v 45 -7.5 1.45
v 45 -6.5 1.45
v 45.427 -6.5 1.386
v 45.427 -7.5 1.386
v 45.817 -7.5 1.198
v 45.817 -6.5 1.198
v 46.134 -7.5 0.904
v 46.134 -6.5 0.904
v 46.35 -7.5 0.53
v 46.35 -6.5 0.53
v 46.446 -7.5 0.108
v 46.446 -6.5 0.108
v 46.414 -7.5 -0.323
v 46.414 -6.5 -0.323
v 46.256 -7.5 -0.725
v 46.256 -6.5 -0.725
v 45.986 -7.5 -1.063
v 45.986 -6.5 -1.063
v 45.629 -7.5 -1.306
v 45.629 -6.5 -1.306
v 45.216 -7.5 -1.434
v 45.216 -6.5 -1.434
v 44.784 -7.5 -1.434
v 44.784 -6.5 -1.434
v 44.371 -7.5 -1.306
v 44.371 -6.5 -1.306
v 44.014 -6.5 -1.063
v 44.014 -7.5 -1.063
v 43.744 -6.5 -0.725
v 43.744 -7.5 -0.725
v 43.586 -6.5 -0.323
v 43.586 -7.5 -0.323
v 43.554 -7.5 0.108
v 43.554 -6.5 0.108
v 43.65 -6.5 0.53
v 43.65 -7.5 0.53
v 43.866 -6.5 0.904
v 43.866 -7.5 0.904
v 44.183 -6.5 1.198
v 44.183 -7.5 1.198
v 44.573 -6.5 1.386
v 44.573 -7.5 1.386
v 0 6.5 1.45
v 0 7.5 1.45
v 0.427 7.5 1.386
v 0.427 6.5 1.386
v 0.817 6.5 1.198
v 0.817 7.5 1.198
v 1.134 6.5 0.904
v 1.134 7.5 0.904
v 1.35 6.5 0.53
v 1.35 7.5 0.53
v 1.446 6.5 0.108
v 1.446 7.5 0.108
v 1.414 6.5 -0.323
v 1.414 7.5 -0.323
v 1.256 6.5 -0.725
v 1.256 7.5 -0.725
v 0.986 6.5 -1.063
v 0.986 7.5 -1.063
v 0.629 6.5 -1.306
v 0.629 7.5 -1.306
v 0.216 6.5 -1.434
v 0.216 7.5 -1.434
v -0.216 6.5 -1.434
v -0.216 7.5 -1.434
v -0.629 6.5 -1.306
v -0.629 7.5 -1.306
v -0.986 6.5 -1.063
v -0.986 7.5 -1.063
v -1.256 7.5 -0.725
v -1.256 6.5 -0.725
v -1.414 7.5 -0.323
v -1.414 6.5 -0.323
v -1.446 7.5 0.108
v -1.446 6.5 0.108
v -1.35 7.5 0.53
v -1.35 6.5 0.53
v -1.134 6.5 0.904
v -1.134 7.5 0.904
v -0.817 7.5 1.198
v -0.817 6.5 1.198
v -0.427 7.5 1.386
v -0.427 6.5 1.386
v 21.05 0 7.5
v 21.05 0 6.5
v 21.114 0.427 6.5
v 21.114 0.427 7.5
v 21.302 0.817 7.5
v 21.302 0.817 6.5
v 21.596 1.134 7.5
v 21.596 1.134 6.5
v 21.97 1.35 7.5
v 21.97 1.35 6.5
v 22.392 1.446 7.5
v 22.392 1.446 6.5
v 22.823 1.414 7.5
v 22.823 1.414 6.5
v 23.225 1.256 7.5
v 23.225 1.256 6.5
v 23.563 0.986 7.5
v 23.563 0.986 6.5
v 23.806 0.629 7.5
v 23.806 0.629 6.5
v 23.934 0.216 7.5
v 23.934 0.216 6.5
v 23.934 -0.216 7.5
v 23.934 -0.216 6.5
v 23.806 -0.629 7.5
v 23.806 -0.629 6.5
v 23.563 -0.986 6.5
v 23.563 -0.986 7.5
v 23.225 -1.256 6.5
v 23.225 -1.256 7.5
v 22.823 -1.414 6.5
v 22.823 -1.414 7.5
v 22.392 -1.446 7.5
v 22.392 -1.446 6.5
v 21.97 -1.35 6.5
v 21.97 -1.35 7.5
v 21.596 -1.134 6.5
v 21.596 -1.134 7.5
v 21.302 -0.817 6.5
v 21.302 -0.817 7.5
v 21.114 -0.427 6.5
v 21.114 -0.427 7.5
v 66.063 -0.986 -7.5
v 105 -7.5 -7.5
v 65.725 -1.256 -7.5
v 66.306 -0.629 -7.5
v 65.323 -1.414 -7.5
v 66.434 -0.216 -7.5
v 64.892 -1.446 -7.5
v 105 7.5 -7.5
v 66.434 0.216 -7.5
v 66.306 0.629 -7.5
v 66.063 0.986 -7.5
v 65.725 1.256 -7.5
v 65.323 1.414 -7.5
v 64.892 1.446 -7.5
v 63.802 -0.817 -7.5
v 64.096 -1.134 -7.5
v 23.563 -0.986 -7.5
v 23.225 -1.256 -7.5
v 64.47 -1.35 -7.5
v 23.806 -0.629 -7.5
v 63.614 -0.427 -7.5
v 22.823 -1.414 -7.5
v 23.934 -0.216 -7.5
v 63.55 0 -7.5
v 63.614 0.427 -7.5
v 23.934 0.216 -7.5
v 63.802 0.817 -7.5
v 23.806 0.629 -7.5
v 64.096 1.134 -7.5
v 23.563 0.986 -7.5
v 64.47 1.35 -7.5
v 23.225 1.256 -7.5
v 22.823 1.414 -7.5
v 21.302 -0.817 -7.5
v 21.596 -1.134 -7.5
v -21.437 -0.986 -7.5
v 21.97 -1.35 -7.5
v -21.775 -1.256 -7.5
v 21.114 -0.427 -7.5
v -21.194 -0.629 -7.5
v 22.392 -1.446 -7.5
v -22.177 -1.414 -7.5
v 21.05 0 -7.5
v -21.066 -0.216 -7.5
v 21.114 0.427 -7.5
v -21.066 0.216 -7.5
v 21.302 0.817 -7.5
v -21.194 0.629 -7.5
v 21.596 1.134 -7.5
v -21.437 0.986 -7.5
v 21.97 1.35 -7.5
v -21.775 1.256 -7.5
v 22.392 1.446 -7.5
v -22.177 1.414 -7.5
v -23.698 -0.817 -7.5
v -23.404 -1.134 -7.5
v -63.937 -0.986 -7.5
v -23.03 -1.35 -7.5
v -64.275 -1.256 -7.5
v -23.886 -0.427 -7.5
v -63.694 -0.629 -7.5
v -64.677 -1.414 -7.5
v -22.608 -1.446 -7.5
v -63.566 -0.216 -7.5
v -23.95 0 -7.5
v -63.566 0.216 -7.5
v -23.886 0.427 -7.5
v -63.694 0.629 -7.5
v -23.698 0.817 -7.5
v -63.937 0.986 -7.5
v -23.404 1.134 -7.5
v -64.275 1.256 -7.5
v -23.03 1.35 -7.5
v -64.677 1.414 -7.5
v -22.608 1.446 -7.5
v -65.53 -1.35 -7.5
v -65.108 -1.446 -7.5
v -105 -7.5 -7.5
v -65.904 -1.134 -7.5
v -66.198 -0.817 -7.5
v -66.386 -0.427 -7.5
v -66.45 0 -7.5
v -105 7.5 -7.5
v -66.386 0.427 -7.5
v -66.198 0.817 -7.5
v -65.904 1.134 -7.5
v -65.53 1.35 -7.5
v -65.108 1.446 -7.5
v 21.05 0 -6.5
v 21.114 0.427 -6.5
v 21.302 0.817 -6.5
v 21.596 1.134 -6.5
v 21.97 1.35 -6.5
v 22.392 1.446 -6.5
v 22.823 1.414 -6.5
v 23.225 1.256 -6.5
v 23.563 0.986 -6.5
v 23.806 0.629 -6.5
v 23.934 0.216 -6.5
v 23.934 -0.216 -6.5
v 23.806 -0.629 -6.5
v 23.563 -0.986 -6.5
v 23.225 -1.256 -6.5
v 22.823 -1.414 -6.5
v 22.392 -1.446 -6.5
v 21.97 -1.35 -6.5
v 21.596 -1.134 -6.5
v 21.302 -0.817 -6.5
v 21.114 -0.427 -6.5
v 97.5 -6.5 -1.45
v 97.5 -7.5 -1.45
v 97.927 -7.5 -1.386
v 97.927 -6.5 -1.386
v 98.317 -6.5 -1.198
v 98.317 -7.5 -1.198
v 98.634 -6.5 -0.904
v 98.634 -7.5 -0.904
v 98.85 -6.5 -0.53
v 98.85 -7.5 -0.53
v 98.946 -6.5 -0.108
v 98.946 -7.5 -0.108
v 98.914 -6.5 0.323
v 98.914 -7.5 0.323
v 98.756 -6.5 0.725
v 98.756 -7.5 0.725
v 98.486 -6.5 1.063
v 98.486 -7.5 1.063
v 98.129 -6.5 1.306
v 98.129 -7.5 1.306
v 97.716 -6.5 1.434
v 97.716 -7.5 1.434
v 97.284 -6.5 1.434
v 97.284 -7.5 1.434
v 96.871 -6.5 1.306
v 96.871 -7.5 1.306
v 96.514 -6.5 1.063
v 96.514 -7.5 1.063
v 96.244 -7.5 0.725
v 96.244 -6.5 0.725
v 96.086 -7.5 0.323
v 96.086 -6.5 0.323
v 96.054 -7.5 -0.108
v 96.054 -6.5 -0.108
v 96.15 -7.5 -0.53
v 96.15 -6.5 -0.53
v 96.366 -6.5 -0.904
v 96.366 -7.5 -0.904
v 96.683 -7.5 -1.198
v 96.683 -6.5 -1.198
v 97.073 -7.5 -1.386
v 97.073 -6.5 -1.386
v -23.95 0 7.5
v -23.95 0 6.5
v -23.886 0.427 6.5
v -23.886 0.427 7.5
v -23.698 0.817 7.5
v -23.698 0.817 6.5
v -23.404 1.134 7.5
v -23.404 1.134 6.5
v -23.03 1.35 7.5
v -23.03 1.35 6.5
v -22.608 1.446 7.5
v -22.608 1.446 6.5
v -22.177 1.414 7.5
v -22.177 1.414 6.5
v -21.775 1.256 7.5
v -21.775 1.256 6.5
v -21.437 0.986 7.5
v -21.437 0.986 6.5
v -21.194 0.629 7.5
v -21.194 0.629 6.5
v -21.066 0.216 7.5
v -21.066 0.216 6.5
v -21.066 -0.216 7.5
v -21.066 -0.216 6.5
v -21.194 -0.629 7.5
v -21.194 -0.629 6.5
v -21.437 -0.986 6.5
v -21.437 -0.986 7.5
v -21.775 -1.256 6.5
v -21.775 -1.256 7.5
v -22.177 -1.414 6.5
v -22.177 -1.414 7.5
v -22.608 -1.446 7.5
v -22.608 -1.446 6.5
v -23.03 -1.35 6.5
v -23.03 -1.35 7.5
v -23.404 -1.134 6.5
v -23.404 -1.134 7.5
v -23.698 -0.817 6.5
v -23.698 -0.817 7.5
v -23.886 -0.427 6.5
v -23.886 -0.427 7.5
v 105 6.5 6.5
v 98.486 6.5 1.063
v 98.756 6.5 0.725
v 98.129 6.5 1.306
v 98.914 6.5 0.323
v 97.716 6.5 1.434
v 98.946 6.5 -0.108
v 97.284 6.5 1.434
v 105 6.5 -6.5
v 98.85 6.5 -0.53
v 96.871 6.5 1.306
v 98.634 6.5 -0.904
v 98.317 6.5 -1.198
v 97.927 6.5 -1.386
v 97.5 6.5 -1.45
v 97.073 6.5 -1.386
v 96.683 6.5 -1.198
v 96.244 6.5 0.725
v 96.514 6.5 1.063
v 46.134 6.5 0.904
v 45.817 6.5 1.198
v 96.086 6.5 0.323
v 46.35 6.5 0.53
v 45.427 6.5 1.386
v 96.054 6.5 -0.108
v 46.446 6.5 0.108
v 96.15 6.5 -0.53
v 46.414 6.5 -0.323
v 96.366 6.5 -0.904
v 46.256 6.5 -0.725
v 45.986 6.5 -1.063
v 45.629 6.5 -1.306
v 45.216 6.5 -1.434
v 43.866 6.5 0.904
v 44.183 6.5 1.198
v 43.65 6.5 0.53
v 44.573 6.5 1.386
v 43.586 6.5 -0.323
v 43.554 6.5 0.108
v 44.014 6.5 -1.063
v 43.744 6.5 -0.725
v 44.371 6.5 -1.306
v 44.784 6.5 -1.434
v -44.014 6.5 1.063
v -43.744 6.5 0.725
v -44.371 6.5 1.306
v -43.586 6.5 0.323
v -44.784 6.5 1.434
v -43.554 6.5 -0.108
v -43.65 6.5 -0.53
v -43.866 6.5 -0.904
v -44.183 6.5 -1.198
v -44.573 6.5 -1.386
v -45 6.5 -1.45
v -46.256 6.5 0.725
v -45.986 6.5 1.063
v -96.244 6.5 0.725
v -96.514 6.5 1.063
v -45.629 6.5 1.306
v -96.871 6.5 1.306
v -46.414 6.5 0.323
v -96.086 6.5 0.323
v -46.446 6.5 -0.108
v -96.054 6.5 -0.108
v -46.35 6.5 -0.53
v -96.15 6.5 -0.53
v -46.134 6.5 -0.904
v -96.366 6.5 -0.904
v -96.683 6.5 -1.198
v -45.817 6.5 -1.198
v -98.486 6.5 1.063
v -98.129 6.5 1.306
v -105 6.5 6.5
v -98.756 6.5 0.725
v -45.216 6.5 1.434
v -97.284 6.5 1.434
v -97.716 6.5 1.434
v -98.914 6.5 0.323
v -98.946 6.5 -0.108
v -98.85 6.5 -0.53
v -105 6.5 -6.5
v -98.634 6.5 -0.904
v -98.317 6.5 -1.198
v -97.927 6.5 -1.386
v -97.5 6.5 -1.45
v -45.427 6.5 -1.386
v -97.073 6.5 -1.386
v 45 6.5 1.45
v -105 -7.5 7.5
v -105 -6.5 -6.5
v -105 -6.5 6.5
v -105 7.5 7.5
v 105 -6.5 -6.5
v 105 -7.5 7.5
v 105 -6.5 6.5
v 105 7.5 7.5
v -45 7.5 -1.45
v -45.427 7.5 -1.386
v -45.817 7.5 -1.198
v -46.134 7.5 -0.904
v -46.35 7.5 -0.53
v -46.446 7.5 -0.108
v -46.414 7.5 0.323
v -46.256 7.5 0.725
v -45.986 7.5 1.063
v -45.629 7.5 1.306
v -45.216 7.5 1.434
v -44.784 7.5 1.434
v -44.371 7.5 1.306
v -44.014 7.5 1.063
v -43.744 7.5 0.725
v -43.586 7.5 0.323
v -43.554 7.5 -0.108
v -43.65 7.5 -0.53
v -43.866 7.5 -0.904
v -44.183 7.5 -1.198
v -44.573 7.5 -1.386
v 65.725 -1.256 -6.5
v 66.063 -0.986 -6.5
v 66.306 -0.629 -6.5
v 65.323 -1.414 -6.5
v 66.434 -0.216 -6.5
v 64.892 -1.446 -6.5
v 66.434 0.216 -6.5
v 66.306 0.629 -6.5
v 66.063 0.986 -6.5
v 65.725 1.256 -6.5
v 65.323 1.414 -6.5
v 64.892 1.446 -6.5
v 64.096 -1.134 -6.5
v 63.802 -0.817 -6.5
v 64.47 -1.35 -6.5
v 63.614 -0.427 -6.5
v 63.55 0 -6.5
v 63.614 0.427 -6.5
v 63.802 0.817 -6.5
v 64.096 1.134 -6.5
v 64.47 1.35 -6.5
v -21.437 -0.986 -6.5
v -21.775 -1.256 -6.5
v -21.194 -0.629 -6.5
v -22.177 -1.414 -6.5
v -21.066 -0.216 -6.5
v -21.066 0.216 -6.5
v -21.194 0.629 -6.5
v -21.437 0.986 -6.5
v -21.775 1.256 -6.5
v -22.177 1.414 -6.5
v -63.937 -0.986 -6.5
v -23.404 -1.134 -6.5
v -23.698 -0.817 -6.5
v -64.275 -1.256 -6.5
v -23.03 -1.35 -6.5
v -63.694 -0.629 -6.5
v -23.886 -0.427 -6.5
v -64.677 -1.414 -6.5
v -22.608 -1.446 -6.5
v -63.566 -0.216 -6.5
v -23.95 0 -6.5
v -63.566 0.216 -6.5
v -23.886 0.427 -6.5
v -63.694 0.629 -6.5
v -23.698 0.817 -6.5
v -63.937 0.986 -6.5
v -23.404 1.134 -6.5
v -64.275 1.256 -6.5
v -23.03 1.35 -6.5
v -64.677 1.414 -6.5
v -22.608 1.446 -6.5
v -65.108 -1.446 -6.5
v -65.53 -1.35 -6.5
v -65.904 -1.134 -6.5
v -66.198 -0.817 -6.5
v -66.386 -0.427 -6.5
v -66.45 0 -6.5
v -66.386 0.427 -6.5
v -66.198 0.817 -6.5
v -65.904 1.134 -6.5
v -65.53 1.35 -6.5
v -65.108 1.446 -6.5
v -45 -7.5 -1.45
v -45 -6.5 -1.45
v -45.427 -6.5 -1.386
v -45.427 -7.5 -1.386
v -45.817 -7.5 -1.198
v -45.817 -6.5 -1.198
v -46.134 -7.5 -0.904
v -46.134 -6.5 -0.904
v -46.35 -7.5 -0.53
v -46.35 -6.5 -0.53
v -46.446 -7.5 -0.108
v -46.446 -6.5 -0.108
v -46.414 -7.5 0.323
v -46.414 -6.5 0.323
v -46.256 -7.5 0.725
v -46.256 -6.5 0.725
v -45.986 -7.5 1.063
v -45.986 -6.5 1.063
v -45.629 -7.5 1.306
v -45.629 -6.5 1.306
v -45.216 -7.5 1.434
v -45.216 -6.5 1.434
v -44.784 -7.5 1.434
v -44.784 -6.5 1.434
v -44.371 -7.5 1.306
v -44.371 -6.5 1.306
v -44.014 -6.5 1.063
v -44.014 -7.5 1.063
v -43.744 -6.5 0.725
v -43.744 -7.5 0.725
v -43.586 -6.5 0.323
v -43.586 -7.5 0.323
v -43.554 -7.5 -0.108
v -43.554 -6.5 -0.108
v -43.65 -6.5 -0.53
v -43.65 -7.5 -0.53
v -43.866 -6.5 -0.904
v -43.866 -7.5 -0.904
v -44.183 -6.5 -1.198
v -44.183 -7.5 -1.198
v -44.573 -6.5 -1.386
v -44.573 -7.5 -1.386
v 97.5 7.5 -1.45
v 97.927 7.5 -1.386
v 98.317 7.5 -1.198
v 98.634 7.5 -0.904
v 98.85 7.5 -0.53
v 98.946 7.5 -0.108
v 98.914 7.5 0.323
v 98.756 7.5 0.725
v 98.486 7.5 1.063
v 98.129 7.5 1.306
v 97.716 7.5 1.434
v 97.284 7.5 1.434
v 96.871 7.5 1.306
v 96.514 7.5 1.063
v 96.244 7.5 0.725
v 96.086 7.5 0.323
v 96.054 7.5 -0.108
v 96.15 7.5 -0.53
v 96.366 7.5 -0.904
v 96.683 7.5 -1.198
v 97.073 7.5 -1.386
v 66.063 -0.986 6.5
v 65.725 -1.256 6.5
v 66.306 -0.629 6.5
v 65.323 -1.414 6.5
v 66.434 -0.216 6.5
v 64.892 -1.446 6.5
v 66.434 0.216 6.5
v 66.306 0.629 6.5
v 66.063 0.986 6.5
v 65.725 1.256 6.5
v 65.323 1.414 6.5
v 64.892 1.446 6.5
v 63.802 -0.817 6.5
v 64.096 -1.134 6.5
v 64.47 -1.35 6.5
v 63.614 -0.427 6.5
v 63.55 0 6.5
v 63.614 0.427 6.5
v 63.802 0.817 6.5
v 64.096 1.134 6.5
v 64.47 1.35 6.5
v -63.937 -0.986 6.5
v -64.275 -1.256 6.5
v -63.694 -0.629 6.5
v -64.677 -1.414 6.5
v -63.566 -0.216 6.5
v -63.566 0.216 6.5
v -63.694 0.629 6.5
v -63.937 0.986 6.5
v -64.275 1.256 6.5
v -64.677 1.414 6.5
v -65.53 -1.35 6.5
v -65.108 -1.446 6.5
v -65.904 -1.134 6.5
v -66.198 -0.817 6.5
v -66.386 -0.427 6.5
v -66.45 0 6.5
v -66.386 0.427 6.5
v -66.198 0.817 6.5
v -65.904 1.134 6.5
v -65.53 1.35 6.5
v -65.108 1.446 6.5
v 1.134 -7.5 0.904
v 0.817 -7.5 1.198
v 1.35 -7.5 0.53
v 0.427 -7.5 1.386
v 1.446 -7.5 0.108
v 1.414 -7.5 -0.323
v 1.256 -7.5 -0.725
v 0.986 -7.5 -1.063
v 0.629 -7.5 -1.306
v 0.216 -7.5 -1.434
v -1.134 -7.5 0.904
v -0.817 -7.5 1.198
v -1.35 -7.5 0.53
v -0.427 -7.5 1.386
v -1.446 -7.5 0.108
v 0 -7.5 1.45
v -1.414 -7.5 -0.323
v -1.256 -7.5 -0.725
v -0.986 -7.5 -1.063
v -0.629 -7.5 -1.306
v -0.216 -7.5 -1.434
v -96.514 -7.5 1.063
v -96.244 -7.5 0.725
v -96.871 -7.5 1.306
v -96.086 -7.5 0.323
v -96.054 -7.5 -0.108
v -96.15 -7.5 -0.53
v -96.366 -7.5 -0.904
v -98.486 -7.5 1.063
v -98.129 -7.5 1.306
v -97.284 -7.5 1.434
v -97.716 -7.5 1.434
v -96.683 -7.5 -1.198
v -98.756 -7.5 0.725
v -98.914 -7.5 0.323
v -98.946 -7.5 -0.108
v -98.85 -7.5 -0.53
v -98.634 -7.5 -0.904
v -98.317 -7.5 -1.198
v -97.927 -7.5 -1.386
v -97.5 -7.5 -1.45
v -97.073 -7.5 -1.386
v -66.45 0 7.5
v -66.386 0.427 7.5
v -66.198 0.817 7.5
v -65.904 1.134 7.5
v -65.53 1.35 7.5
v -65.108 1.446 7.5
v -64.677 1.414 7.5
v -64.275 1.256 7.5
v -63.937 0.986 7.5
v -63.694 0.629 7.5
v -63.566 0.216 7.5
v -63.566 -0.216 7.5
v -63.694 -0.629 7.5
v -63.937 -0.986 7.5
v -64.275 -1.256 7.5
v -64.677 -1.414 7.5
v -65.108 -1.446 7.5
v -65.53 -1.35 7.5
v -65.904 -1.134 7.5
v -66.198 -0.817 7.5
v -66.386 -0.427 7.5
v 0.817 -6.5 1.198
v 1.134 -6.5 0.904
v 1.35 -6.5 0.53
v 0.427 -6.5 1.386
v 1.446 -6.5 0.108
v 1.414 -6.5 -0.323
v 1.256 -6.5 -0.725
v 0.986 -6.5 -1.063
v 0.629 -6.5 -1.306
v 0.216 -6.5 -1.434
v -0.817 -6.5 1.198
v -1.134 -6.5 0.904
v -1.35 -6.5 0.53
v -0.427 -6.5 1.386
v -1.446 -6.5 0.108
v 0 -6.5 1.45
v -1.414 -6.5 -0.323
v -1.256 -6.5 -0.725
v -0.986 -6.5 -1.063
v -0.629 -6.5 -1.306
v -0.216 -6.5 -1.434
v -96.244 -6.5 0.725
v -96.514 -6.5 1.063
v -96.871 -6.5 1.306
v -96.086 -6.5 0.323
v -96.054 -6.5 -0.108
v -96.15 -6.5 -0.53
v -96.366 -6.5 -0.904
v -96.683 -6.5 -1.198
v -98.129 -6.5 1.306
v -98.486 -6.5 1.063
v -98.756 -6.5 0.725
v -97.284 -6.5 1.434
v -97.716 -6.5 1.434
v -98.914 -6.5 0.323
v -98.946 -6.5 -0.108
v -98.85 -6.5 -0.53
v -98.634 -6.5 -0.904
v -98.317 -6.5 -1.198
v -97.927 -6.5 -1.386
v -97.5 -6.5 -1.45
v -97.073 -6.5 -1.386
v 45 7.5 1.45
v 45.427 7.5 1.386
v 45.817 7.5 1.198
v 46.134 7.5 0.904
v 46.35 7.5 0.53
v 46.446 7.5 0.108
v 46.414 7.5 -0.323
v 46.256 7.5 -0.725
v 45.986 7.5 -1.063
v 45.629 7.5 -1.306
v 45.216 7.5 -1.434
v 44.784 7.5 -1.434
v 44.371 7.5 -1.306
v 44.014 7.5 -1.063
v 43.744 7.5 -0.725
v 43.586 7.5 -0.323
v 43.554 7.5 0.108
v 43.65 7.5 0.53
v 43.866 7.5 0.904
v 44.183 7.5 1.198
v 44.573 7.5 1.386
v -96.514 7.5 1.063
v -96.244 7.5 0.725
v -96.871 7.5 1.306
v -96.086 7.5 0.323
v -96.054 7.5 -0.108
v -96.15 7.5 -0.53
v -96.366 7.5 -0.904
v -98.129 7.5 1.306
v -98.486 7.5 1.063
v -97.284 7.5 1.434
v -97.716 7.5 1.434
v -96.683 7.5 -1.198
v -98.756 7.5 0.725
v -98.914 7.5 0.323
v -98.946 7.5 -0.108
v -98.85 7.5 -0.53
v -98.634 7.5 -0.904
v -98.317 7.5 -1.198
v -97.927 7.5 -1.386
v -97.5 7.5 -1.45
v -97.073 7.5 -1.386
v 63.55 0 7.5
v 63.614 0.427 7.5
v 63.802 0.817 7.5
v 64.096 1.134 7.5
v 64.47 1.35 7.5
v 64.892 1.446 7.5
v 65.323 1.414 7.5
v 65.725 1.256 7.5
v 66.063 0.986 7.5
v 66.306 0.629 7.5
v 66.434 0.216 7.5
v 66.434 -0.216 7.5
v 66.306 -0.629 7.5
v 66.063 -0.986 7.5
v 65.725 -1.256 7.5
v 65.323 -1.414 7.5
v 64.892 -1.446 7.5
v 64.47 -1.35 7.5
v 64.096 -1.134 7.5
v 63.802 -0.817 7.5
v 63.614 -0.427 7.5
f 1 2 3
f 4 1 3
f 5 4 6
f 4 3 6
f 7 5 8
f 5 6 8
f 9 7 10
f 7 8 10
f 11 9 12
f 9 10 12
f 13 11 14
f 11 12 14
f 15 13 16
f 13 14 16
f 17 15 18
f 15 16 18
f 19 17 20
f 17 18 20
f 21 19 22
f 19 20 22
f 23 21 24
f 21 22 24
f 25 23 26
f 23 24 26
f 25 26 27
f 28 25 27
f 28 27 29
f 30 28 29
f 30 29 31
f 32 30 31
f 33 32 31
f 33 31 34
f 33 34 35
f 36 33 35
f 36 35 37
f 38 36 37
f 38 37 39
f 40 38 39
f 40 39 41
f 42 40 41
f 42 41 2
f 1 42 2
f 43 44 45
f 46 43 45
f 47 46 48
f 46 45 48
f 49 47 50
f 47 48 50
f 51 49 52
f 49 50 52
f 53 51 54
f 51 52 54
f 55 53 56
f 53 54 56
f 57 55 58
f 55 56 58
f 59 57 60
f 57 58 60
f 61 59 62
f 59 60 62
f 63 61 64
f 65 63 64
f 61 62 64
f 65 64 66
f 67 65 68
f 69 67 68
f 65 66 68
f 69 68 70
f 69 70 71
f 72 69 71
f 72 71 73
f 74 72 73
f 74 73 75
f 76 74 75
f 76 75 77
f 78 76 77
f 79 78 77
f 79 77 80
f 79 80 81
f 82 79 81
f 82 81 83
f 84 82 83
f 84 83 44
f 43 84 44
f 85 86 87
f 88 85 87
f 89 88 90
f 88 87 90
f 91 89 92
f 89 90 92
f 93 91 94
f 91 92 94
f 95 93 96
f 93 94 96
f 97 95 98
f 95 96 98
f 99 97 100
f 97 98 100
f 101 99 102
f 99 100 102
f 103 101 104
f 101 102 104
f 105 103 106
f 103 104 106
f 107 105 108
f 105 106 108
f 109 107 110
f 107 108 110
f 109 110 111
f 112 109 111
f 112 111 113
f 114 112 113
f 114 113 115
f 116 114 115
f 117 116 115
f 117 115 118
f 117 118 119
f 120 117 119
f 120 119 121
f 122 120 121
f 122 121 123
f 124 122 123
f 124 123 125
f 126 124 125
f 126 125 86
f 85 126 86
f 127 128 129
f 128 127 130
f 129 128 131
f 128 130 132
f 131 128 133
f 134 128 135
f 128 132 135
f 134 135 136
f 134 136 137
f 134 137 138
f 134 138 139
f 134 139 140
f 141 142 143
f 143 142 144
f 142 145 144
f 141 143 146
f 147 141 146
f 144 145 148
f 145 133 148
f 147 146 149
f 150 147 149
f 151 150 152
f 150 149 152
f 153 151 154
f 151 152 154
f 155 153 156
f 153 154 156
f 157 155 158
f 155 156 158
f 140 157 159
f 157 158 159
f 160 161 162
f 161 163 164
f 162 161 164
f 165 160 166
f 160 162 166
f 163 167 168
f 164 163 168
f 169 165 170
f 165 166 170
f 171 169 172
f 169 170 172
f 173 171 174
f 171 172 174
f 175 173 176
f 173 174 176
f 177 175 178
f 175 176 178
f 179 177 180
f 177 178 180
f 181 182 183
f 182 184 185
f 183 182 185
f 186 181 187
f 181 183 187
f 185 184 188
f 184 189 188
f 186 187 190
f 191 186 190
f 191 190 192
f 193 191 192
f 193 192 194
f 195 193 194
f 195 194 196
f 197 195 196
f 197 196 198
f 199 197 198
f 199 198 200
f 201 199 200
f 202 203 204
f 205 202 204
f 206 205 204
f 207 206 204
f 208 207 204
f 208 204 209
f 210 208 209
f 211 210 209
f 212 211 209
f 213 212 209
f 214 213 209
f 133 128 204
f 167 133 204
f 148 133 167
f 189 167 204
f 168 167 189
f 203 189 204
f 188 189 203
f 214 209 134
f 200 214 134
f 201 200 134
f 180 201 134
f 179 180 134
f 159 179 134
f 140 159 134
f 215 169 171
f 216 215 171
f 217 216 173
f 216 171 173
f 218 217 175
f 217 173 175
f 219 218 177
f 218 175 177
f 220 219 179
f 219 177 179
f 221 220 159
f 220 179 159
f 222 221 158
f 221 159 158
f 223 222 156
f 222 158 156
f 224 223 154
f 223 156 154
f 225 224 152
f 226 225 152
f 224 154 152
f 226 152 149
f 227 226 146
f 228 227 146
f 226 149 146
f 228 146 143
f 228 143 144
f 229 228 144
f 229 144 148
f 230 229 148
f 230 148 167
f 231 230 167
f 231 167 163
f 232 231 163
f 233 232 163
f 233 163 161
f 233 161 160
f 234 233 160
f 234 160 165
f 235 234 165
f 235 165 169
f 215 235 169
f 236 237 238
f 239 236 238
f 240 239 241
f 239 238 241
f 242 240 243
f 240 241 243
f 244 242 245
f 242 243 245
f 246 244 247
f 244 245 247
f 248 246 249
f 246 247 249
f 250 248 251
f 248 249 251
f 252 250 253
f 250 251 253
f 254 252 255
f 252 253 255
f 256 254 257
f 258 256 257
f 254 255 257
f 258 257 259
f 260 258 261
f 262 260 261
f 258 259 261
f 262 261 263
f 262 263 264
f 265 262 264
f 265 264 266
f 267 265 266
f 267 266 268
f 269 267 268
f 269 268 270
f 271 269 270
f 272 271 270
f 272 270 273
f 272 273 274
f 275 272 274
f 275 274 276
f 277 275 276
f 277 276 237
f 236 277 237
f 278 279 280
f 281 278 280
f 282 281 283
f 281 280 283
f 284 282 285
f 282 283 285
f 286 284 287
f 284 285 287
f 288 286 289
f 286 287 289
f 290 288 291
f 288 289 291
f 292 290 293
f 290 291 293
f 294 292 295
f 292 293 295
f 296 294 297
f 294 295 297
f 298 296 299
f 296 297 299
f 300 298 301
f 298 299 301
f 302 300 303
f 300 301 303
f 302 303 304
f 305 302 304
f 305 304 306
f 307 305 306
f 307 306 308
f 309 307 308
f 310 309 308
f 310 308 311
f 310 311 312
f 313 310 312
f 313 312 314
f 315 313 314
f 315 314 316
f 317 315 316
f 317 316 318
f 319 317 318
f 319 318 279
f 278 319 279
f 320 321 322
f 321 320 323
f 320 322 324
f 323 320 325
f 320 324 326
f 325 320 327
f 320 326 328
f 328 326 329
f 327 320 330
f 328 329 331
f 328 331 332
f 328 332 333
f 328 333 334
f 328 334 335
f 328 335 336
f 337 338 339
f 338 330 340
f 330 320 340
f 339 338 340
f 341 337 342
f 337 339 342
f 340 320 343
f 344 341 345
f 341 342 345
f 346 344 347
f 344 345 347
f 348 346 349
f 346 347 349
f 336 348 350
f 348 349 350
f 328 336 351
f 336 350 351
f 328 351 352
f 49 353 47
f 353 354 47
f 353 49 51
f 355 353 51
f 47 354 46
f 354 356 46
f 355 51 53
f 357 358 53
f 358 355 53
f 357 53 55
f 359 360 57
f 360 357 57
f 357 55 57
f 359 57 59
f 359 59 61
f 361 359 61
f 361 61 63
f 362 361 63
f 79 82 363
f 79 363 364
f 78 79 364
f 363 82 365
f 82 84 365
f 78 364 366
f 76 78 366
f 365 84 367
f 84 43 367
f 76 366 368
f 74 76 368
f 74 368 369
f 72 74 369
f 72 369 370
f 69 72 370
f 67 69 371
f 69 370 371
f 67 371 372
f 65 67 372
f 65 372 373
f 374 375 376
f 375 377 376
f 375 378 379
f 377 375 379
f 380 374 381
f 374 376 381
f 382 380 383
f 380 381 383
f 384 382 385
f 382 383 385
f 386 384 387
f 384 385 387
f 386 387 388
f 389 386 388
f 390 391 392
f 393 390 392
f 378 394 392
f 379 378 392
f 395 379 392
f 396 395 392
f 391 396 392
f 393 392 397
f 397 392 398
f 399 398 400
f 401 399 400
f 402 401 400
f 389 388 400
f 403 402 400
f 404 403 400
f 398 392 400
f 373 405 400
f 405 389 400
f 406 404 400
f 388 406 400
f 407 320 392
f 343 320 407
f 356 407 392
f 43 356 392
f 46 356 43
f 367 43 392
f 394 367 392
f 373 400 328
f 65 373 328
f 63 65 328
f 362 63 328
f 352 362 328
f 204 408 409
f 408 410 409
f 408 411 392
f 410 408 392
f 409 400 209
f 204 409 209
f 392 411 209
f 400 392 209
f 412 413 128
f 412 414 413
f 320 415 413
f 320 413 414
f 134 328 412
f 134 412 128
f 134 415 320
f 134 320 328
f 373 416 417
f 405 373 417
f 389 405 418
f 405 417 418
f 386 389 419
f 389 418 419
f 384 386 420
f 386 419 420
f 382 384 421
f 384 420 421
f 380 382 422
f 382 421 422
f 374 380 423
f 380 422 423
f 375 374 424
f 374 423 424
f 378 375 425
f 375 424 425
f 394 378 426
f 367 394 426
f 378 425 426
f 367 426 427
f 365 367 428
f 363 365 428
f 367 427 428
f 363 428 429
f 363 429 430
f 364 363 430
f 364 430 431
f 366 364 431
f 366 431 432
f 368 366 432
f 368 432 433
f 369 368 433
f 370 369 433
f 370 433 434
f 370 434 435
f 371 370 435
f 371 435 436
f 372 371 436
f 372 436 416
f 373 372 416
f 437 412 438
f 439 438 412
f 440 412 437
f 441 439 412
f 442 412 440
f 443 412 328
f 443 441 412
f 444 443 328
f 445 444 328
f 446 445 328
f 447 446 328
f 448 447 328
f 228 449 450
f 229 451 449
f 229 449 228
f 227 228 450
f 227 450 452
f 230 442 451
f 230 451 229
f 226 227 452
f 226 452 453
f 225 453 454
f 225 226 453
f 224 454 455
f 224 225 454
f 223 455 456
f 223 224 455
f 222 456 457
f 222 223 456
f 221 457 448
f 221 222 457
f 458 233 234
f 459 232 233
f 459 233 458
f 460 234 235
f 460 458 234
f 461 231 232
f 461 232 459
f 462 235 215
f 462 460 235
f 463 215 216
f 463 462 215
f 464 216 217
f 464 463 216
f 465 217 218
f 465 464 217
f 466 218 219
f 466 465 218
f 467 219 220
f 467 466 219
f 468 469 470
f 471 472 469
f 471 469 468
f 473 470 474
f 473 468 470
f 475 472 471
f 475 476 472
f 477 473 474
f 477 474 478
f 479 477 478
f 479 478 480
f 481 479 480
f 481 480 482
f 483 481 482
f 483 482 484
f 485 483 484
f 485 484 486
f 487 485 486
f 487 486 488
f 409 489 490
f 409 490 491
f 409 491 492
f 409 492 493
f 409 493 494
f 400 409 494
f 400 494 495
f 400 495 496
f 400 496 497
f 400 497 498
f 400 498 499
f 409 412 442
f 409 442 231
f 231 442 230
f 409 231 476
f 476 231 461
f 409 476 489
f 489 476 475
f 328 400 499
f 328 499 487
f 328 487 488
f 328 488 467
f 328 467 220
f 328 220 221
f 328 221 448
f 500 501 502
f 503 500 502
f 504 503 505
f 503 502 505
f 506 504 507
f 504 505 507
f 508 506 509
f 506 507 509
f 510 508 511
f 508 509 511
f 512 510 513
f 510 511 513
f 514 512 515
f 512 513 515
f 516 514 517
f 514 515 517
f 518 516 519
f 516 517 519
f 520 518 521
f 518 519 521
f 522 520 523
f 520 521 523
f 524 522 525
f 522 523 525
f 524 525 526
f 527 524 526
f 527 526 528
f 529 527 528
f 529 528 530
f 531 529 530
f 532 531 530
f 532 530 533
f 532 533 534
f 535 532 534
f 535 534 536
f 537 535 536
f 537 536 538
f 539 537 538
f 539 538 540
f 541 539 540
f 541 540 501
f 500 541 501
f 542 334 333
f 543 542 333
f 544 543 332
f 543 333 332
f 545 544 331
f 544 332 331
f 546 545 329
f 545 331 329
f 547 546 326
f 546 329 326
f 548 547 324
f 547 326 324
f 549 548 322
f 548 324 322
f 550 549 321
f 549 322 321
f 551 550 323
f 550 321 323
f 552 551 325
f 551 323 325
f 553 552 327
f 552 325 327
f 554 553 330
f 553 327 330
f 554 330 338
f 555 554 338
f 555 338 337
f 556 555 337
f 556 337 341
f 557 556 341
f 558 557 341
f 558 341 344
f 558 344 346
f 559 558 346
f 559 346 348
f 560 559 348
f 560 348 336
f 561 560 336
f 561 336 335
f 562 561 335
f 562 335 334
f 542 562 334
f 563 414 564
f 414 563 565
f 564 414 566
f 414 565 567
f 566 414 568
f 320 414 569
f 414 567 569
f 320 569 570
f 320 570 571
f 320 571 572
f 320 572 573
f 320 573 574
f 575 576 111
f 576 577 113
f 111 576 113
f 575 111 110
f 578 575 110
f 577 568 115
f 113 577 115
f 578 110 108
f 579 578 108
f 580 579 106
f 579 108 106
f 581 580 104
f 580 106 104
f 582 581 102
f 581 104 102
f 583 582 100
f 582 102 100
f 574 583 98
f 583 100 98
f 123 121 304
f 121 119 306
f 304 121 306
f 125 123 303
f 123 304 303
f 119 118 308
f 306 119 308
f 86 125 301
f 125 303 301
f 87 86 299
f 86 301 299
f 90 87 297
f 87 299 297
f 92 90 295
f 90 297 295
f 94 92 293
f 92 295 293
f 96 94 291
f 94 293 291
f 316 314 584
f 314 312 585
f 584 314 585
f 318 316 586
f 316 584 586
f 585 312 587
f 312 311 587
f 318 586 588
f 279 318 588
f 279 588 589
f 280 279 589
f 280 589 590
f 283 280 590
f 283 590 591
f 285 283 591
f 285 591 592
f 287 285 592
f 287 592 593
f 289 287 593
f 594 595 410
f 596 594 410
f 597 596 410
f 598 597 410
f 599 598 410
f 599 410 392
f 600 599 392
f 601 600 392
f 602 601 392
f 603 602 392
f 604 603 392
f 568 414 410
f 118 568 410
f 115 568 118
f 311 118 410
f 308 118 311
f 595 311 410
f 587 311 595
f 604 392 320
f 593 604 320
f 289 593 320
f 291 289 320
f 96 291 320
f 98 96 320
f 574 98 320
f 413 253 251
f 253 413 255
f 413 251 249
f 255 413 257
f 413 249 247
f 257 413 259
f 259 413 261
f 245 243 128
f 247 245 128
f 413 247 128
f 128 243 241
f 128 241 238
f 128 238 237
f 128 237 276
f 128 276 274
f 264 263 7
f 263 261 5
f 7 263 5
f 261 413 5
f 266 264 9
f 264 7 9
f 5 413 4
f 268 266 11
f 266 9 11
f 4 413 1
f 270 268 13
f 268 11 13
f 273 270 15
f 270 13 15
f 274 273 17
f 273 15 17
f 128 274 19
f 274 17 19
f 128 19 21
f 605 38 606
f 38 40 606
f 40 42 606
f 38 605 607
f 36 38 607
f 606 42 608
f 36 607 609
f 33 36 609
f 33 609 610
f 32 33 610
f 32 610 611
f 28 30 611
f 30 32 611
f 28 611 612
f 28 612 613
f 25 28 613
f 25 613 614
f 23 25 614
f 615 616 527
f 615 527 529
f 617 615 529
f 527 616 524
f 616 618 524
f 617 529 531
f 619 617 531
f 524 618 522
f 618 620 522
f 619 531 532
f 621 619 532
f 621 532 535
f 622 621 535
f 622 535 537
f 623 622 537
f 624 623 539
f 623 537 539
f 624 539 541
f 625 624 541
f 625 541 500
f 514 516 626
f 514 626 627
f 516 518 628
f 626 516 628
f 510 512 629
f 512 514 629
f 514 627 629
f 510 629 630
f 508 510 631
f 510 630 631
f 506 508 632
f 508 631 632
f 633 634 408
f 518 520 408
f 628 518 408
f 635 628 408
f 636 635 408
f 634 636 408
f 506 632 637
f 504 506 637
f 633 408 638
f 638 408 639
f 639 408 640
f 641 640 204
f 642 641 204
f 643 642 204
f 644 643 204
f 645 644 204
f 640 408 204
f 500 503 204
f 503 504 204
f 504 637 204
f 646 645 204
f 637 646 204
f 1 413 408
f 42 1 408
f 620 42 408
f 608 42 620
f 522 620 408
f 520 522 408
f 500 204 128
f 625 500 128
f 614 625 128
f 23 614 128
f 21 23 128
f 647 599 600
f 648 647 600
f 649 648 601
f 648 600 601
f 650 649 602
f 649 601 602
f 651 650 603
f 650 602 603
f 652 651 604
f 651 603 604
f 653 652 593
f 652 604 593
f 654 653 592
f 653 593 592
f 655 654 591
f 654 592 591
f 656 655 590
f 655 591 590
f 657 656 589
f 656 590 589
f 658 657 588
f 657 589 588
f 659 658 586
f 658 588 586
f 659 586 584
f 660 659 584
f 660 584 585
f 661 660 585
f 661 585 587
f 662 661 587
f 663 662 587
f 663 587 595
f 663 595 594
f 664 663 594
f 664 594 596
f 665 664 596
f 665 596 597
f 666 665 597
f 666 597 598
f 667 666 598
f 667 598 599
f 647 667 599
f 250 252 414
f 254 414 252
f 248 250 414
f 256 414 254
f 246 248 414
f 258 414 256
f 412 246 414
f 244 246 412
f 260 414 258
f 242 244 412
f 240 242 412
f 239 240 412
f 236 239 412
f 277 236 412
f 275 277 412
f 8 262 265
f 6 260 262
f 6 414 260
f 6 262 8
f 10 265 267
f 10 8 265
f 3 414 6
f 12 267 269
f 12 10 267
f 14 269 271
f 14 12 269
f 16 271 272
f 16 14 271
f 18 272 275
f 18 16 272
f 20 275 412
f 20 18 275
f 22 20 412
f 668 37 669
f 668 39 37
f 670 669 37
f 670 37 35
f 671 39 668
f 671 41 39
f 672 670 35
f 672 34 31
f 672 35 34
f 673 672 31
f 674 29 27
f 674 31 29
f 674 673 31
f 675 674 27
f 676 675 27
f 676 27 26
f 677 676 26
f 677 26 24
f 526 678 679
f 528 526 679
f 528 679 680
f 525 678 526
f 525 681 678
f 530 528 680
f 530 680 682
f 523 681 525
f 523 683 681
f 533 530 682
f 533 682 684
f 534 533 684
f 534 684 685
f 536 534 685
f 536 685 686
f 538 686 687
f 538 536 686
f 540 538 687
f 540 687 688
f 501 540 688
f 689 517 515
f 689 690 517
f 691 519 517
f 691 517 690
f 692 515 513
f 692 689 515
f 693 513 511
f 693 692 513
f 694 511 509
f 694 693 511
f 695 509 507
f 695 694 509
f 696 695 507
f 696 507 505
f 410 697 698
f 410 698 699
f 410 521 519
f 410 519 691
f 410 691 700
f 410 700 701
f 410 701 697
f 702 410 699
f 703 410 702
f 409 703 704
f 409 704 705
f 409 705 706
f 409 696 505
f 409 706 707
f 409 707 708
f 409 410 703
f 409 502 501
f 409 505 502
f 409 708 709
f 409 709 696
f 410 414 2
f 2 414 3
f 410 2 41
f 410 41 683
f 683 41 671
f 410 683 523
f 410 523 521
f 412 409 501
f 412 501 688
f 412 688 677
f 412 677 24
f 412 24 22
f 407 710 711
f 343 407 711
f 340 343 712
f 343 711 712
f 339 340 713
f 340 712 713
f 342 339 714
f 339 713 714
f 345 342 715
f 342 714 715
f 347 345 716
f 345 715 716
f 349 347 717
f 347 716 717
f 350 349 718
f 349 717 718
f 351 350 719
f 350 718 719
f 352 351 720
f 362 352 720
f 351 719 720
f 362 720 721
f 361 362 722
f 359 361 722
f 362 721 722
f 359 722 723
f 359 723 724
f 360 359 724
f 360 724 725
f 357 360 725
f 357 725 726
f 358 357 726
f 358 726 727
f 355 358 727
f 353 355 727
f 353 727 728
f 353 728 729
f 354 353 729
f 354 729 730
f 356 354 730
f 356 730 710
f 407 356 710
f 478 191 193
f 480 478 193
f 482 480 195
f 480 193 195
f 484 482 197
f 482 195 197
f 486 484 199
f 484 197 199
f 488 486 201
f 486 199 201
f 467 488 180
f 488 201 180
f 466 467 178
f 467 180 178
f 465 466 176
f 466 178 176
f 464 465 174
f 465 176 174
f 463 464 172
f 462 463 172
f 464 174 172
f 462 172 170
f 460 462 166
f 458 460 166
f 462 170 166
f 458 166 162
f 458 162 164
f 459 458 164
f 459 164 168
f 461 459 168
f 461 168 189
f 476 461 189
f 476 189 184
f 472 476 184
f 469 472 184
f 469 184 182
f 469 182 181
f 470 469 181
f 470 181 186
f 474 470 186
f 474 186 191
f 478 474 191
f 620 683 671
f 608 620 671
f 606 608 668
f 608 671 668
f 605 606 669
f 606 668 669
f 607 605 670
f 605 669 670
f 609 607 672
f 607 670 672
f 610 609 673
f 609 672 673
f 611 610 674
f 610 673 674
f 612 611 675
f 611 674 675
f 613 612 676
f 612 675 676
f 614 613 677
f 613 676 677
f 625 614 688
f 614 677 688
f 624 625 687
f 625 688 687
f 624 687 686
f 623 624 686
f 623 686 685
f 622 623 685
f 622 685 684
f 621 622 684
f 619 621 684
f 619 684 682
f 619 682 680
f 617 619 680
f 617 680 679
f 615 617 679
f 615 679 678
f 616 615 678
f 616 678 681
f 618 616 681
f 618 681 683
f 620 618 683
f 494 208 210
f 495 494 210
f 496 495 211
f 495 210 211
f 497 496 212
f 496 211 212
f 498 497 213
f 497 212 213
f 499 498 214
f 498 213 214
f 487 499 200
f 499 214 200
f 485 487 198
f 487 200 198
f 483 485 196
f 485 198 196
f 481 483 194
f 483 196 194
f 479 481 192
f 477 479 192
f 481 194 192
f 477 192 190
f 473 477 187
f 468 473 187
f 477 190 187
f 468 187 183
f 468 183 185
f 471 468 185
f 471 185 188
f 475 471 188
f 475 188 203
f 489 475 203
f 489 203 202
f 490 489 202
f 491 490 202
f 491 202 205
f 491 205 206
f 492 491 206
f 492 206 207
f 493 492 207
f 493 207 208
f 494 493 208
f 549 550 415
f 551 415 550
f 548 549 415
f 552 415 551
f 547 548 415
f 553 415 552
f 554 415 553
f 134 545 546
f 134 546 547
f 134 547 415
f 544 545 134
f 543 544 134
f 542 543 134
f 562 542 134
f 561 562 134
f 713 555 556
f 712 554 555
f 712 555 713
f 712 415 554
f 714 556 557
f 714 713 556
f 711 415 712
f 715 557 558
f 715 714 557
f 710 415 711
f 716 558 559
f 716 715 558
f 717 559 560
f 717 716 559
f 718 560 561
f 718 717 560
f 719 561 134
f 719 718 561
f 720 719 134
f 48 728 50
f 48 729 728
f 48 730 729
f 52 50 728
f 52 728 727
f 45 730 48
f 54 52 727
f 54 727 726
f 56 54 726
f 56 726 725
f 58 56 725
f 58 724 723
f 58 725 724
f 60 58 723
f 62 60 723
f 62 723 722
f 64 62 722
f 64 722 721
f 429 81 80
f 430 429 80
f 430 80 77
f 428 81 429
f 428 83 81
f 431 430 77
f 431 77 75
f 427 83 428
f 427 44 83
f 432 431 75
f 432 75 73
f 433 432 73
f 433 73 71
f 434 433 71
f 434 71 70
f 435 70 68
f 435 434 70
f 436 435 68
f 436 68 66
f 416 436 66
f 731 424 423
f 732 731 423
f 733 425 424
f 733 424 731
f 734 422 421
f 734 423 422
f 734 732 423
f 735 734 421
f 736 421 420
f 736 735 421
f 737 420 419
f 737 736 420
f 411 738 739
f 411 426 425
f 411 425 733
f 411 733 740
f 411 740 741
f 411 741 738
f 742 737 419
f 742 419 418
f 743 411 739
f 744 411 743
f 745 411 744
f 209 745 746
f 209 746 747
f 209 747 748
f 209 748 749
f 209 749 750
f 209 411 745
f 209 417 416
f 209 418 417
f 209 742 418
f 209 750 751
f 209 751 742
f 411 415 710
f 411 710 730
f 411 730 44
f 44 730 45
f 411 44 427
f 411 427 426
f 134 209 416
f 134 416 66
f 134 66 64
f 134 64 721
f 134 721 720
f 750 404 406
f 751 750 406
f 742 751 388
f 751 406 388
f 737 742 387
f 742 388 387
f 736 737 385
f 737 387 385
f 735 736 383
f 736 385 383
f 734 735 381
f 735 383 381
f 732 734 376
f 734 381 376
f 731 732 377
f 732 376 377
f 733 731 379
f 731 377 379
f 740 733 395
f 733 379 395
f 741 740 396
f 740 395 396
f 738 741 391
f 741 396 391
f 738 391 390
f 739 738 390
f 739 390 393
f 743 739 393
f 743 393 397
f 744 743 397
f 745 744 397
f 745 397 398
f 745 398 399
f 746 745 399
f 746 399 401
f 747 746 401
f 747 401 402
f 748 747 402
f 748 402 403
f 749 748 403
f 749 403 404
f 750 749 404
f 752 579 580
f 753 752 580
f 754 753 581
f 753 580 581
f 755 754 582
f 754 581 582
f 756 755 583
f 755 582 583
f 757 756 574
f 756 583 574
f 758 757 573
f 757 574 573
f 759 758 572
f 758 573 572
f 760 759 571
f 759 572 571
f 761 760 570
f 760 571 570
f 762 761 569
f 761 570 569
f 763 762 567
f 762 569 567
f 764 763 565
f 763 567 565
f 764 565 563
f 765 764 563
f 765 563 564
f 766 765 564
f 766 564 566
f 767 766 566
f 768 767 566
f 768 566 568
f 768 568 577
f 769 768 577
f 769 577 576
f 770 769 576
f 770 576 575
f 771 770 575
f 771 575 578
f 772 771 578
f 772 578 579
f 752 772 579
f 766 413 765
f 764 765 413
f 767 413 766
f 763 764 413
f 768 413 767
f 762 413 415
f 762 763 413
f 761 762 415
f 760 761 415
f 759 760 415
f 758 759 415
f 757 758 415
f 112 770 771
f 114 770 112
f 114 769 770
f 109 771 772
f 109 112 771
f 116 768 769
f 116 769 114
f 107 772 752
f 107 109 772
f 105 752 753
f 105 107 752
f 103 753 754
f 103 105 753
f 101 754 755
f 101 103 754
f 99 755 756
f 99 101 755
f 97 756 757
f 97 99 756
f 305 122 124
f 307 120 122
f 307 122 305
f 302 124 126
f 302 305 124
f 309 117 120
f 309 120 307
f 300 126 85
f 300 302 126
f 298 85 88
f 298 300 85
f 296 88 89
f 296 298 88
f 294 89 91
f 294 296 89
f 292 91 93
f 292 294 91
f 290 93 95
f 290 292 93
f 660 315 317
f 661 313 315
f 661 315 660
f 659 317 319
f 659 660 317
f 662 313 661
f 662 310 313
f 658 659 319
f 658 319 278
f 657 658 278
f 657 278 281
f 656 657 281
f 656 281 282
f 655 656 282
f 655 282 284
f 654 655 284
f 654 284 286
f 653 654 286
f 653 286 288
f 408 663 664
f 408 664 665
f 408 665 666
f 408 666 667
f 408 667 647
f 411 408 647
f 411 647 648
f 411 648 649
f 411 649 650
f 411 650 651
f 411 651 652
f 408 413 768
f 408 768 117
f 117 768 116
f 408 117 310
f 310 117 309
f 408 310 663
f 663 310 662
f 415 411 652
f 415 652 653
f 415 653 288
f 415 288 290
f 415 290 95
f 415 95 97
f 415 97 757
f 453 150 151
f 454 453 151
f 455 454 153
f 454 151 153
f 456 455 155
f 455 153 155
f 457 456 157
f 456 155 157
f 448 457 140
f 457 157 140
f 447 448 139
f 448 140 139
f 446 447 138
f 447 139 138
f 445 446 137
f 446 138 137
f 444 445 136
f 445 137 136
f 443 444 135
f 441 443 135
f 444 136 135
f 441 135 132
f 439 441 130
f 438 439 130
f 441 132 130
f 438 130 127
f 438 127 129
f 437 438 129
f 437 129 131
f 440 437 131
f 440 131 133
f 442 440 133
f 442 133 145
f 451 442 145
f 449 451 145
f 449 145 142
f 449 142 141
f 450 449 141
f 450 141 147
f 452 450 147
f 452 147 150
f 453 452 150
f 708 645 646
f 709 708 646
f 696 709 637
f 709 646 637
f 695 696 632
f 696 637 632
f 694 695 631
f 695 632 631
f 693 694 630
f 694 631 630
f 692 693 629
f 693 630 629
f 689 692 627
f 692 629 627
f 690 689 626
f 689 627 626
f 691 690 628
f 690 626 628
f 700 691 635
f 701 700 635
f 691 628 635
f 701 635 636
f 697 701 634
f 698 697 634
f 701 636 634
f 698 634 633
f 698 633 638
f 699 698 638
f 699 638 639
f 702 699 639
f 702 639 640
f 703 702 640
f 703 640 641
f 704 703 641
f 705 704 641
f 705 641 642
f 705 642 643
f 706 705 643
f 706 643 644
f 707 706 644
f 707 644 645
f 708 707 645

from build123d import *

# Parameters (mm, degrees)
SKETCH_11_W         = 15
SKETCH_11_H         = 15
SKETCH_11_W_2       = 13
SKETCH_11_H_2       = 13
F_15X15X1_1_DEPTH   = 210
SKETCH_12_R         = 1.45
CUT_EXTRUDE_1_DEPTH = 107.330851591
SKETCH_14_R         = 1.45
CUT_EXTRUDE_3_DEPTH = 107.330851591
SKETCH_15_R         = 1.45
CUT_EXTRUDE_4_DEPTH = 107.330851591


with BuildPart() as part:
    # 草图11 → 铝管 15X15X1(1) (new body)
    with BuildSketch(Plane(origin=(-105, 0, 0), x_dir=(0, 0, -1), z_dir=(1, 0, 0))):
        Rectangle(SKETCH_11_W, SKETCH_11_H)
        Rectangle(SKETCH_11_W_2, SKETCH_11_H_2, mode=Mode.SUBTRACT)
    extrude(amount=F_15X15X1_1_DEPTH)

    # 草图12 → 切除-拉伸1 (cut, through all)
    with BuildSketch(Plane(origin=(0, 0, -7.5), x_dir=(-1, 0, 0), z_dir=(0, 0, -1))):
        with Locations((22.5, 0)):
            Circle(SKETCH_12_R)
        with Locations((65, 0)):
            Circle(SKETCH_12_R)
        with Locations((-65, 0)):
            Circle(SKETCH_12_R)
        with Locations((-22.5, 0)):
            Circle(SKETCH_12_R)
    extrude(amount=-CUT_EXTRUDE_1_DEPTH, mode=Mode.SUBTRACT)

    # 草图14 → 切除-拉伸3 (cut, through all)
    with BuildSketch(Plane(origin=(0, 7.5, 0), x_dir=(1, 0, 0), z_dir=(0, 1, 0))):
        with Locations(Location((0, 0, 0), (0, 0, 270))):
            Circle(SKETCH_14_R)
        with Locations(Location((45, 0, 0), (0, 0, 270))):
            Circle(SKETCH_14_R)
        with Locations(Location((-45, 0, 0), (0, 0, 90))):
            Circle(SKETCH_14_R)
    extrude(amount=-CUT_EXTRUDE_3_DEPTH, mode=Mode.SUBTRACT)

    # 草图15 → 切除-拉伸4 (cut, through all)
    with BuildSketch(Plane.XZ.offset(7.5)):
        with Locations(Location((-97.5, 0, 0), (0, 0, 270))):
            Circle(SKETCH_15_R)
        with Locations(Location((97.5, 0, 0), (0, 0, 270))):
            Circle(SKETCH_15_R)
    extrude(amount=-CUT_EXTRUDE_4_DEPTH, mode=Mode.SUBTRACT)


solid = part.part
